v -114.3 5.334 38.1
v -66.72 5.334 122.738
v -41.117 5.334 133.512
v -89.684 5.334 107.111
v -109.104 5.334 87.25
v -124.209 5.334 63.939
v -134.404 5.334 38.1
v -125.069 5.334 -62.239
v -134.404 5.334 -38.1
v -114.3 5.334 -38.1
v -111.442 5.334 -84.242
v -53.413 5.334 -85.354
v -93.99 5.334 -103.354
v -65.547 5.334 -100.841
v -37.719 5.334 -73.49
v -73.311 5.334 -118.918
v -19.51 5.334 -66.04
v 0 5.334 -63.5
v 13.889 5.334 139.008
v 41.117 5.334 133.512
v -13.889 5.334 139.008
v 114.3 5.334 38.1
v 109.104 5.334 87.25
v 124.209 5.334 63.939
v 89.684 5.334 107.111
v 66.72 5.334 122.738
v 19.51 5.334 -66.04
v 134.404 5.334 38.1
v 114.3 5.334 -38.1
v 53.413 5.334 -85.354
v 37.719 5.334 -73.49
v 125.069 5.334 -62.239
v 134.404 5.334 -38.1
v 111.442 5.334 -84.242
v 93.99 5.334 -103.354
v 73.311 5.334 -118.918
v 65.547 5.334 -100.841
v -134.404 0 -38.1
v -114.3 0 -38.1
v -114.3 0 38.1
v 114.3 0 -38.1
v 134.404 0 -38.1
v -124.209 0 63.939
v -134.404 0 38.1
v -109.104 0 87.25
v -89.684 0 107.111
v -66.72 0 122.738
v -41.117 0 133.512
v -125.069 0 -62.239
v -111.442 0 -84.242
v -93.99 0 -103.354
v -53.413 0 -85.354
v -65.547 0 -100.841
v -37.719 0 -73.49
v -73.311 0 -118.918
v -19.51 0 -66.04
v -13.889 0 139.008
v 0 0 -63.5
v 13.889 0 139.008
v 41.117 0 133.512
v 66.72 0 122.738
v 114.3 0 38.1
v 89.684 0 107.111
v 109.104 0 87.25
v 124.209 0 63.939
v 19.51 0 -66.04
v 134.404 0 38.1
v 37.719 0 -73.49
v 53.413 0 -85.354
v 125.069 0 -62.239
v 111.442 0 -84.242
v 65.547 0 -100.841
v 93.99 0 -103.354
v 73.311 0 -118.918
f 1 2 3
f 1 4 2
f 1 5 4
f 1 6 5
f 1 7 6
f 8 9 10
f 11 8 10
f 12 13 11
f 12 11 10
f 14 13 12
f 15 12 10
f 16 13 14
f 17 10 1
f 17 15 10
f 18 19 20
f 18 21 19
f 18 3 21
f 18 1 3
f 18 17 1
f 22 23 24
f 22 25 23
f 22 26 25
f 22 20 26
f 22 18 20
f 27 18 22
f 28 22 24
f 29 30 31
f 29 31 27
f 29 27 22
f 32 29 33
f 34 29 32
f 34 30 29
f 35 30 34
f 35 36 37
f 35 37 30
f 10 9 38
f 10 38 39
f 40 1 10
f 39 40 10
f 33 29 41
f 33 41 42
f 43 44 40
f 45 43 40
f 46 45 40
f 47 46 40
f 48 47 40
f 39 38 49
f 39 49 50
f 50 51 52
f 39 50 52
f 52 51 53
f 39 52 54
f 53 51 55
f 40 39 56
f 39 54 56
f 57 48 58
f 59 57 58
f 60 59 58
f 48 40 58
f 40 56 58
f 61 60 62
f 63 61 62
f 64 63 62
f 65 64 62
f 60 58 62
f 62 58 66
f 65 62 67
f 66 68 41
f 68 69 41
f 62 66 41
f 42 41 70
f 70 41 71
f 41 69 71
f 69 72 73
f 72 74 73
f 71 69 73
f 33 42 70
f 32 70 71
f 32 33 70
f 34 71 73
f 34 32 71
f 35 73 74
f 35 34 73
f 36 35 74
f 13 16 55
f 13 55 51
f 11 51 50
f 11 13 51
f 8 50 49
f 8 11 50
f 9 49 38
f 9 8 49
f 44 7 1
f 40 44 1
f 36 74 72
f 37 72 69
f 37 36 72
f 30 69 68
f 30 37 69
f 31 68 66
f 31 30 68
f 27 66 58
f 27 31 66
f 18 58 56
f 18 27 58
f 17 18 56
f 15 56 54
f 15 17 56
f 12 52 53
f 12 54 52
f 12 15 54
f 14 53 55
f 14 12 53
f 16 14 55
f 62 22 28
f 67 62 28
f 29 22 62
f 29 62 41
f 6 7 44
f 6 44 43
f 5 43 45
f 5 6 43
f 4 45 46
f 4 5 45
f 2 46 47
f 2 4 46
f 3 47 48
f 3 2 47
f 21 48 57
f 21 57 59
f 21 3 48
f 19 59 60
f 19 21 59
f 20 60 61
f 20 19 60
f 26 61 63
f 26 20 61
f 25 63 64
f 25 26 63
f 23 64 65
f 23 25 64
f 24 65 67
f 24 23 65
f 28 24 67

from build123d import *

# Parameters (mm, degrees)
SKETCH2_W           = 279.4
SKETCH2_H           = 279.4
BOSS_EXTRUDE1_DEPTH = 5.334
SKETCH3_OUTSIDE_W   = 360.434
SKETCH3_OUTSIDE_H   = 360.434
CUT_EXTRUDE1_DEPTH  = 198.637626873
SKETCH4_W           = 50.8
SKETCH4_H           = 76.2
CUT_EXTRUDE2_DEPTH  = 198.637626873


with BuildPart() as part:
    # Sketch2 → Boss-Extrude1 (new body)
    with BuildSketch(Plane(origin=(0, 0, 0), x_dir=(1, 0, 0), z_dir=(0, 1, 0))):
        Rectangle(SKETCH2_W, SKETCH2_H)
    extrude(amount=BOSS_EXTRUDE1_DEPTH)

    # Sketch3 outside → Cut-Extrude1 (cut, through all)
    with BuildSketch(Plane(origin=(0, 5.334, 0), x_dir=(1, 0, 0), z_dir=(0, 1, 0))):
        Rectangle(SKETCH3_OUTSIDE_W, SKETCH3_OUTSIDE_H)
        with BuildLine():
            ThreePointArc((-73.311363601, 118.918181818), (0, -139.7), (73.311363601, 118.918181818))
            ThreePointArc((73.311363601, 118.918181818), (0, 63.5), (-73.311363601, 118.918181818))
        make_face(mode=Mode.SUBTRACT)
    extrude(amount=-CUT_EXTRUDE1_DEPTH, mode=Mode.SUBTRACT)

    # Sketch4 → Cut-Extrude2 (cut, through all)
    with BuildSketch(Plane(origin=(0, 5.334, 0), x_dir=(1, 0, 0), z_dir=(0, 1, 0))):
        with Locations((-139.7, 0)):
            Rectangle(SKETCH4_W, SKETCH4_H)
        with Locations((139.7, 0)):
            Rectangle(SKETCH4_W, SKETCH4_H)
    extrude(amount=-CUT_EXTRUDE2_DEPTH, mode=Mode.SUBTRACT)


solid = part.part
